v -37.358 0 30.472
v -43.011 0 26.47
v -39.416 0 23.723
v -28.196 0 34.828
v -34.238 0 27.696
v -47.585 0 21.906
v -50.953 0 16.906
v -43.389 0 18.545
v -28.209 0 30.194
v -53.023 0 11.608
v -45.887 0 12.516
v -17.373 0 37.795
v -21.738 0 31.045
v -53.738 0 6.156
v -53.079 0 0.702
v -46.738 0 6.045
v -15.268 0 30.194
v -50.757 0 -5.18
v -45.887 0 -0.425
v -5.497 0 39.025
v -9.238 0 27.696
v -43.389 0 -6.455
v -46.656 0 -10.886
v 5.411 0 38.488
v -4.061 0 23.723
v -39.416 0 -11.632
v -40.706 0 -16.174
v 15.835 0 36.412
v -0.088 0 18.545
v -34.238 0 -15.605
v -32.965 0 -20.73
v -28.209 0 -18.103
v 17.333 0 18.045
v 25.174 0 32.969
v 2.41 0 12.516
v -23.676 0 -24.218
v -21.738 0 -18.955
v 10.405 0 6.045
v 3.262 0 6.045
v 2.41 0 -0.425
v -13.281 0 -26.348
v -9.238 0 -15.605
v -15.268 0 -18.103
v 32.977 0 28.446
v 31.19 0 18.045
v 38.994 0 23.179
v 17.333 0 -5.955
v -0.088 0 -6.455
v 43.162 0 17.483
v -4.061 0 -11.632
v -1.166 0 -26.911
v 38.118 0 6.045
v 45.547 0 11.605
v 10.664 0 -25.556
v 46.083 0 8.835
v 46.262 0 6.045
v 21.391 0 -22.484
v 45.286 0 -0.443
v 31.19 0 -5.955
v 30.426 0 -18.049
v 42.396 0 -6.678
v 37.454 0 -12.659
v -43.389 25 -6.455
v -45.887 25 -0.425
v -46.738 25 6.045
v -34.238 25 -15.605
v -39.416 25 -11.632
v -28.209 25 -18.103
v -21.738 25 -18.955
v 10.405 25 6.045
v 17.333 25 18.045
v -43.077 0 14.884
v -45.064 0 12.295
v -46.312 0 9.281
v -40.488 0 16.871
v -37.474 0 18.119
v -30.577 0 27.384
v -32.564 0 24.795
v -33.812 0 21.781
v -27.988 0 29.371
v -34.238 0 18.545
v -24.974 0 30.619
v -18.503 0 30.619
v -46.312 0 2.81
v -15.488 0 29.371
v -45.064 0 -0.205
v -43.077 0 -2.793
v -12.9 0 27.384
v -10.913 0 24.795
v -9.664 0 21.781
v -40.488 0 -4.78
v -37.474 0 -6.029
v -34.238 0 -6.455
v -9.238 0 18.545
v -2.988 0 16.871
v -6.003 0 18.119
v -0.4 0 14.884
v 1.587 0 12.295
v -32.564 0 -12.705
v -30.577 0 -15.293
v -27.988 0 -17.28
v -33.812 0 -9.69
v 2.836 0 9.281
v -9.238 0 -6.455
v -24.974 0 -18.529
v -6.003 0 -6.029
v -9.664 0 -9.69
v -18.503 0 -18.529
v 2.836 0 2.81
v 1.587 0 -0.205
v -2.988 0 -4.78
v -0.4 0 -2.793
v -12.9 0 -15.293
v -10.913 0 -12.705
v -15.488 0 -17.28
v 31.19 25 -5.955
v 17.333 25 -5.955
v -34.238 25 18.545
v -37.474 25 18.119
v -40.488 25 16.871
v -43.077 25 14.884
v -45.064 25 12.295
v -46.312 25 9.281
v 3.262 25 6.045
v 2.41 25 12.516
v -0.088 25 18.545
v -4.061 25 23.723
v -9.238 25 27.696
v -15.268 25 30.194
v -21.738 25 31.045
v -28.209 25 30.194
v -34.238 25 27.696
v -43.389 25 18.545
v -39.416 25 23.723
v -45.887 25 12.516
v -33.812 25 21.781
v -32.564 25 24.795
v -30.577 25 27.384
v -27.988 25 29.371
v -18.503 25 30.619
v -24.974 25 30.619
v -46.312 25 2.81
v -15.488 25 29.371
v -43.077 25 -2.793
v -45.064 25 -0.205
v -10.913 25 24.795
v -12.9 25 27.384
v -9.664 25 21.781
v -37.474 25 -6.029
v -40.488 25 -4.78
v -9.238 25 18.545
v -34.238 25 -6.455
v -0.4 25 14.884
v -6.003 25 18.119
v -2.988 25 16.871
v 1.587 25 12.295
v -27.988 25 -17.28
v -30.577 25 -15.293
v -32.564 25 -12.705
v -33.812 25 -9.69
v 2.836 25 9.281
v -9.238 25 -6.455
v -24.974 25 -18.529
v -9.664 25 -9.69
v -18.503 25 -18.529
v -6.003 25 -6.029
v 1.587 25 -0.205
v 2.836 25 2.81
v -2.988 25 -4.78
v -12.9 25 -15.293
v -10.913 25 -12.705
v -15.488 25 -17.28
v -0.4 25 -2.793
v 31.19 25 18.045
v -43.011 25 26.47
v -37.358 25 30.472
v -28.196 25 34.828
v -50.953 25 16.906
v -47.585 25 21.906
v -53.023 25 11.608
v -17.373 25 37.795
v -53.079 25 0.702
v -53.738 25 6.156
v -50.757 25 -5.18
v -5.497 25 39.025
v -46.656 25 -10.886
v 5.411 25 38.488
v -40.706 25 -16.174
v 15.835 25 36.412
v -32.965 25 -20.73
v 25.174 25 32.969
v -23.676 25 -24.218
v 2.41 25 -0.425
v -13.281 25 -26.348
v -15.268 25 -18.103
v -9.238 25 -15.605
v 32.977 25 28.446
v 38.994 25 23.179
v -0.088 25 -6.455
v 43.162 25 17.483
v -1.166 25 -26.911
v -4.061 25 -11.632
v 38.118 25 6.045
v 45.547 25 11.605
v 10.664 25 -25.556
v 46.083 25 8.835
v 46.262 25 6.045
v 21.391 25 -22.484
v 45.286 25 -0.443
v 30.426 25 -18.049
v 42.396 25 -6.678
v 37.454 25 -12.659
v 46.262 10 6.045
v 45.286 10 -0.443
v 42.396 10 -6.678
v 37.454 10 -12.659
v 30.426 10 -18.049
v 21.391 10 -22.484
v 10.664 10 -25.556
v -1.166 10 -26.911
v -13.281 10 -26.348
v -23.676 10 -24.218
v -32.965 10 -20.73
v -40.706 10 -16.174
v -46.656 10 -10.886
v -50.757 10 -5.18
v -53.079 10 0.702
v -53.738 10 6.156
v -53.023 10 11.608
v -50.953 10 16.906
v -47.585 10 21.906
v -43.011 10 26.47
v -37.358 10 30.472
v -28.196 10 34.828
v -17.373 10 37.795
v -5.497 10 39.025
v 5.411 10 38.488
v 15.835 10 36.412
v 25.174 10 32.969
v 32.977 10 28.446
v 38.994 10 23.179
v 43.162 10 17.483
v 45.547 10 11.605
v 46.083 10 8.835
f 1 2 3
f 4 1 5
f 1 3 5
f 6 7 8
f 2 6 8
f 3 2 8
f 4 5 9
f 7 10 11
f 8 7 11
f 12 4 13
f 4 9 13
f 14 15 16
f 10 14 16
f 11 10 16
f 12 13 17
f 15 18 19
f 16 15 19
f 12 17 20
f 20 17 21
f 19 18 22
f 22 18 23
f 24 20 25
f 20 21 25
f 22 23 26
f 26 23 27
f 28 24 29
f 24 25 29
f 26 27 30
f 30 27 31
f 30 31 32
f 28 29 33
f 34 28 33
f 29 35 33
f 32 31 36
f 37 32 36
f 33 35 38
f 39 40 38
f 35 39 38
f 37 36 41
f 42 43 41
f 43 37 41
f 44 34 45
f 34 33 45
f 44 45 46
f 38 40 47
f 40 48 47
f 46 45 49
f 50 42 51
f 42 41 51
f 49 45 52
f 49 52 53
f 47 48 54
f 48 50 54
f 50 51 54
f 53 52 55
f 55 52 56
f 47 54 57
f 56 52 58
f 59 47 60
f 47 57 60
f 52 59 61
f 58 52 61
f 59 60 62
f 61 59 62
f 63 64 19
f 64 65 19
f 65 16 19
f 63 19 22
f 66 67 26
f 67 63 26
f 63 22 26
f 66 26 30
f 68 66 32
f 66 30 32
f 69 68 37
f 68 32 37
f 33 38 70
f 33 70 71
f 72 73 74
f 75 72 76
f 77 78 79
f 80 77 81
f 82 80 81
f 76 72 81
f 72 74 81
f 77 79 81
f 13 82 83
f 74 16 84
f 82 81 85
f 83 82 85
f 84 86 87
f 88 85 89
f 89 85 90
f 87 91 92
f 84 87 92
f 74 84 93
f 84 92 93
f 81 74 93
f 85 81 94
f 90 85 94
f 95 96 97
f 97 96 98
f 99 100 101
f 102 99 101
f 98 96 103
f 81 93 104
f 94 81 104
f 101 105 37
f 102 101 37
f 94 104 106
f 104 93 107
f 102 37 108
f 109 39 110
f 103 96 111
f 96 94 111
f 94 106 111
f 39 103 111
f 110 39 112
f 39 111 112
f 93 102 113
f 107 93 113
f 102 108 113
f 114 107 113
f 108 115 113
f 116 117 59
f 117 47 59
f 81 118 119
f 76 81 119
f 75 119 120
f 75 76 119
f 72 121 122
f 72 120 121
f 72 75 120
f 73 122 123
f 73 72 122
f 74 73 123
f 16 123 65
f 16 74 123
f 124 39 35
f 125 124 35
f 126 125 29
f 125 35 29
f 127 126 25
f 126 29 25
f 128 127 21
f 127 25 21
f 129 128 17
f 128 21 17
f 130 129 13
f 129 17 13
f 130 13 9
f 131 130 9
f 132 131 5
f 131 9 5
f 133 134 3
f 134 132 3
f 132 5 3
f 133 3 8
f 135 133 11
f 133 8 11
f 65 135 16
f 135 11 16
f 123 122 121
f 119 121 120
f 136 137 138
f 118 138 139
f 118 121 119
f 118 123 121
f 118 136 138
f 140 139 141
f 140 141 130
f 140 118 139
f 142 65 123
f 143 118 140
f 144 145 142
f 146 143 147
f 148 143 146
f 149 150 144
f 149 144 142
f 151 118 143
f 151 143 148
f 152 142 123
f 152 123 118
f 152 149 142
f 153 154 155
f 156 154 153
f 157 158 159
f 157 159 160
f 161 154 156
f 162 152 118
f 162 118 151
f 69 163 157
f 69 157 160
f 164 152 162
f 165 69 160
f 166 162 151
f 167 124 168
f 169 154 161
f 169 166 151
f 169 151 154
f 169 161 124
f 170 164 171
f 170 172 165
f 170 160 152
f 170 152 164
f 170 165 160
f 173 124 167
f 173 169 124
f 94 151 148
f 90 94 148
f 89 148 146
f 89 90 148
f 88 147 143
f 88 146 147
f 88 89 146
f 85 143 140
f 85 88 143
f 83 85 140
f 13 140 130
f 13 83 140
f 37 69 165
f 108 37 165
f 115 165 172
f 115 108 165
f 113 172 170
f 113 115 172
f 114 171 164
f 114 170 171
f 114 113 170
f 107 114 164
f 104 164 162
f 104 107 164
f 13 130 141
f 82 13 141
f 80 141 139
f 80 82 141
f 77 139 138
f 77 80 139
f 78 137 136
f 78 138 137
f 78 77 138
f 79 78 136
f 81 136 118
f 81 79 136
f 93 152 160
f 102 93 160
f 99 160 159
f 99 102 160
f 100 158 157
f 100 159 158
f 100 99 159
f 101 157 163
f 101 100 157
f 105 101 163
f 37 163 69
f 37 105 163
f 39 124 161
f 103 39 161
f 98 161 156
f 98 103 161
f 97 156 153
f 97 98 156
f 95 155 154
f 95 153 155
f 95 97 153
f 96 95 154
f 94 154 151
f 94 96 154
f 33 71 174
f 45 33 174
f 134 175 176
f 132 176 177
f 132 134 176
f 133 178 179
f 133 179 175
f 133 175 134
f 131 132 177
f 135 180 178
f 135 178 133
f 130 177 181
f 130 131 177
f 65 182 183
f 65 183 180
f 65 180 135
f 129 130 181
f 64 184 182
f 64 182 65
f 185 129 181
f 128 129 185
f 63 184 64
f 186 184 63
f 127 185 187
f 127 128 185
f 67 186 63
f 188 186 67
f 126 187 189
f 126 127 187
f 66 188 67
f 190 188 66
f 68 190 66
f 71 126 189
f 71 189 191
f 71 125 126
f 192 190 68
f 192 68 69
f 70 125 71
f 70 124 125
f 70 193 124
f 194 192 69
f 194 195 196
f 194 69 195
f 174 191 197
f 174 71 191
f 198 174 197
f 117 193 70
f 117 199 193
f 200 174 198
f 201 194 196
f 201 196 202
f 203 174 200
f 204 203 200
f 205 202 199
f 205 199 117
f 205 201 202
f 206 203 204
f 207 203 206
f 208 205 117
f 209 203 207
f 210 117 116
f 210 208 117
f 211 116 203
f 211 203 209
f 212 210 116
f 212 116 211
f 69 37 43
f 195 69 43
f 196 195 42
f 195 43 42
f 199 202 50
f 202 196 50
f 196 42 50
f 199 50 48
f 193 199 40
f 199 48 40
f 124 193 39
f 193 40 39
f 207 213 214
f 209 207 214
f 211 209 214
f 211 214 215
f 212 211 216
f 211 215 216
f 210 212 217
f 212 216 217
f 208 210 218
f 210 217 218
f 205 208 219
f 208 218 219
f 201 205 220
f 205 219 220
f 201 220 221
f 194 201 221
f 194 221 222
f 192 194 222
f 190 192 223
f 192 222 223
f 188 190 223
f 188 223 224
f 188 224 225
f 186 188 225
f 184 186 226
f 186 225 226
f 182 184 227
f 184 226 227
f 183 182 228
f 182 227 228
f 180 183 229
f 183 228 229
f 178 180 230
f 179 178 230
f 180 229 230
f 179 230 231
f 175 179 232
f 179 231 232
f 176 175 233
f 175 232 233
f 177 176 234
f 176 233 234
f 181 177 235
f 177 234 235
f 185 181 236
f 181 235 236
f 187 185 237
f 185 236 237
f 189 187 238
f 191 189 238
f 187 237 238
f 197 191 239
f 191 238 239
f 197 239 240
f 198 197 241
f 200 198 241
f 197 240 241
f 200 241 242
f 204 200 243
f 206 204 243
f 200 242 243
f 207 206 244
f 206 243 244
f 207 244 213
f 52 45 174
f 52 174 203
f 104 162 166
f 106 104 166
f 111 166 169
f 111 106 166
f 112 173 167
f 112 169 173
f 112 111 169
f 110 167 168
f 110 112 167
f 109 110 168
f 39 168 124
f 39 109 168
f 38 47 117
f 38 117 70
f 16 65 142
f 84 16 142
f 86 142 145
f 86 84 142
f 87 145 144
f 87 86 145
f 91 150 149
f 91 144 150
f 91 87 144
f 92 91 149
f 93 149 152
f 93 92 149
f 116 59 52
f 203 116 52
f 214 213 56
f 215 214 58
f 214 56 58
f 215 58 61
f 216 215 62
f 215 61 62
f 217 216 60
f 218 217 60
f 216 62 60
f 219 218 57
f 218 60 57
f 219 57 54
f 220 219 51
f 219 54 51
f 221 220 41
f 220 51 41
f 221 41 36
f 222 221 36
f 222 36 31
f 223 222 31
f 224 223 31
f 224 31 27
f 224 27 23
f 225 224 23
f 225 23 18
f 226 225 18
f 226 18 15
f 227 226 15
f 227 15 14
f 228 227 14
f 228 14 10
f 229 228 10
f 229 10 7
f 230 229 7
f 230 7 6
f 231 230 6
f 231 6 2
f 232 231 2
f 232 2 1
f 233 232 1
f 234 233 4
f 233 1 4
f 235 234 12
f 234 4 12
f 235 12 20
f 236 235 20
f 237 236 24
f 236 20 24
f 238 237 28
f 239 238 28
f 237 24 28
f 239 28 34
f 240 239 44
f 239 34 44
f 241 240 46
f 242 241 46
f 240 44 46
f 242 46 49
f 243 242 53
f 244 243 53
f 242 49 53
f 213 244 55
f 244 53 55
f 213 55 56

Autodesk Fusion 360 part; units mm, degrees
sketch "草图1" plane through (0, 0, 0) normal (0, 1, 0) x (1, 0, 0)
  ellipse E0 centre (-3.7384, -6.0454) end of major axis (46.2616, -6.0454) minor radius 33
  circle A0 centre (-21.7384, -6.0454) radius 25
  line L0 (17.3334, 5.9546) -> (31.1898, 5.9546)
  line L1 (14.987, -18.0454) -> (31.1898, -18.0454)
  line L2 (31.1898, 5.9546) -> (38.118, -6.0454)
  line L3 (31.1898, -18.0454) -> (38.118, -6.0454)
  line L4 (17.3334, 5.9546) -> (10.4052, -6.0454)
  line L5 (10.4052, -6.0454) -> (17.3334, -18.0454)
  line L6 (-53.7384, -6.0454) -> (10.4052, -6.0454) construction
  line L7 (38.118, -6.0454) -> (46.2616, -6.0454) construction
  line L8 (-3.7384, -39.0454) -> (-3.7384, -23.3947) construction
  line L9 (-3.7384, 11.304) -> (-3.7384, 26.9546) construction
  arc A1 (-34.2384, 6.4546) -> (-34.2384, -18.5454) centre (-34.2384, -6.0454) ccw
  arc A2 (-9.2384, 6.4546) -> (-34.2384, 6.4546) centre (-21.7384, 6.4546) ccw
  arc A3 (-34.2384, -18.5454) -> (-9.2384, -18.5454) centre (-21.7384, -18.5454) ccw
  arc A4 (-9.2384, -18.5454) -> (-9.2384, 6.4546) centre (-9.2384, -6.0454) ccw
  dimension "d1" = 100
  dimension "d2" = 66
  dimension "d4" = 50
extrude "拉伸1" add sketch "草图1" along normal blind 10 contours E0 | A1 A2 A3 A4
extrude "拉伸2" add 2 faces at (8.5366, 10, -13.0979) (-25.9051, 10, 1.8787) along direction (0, 1, 0) blind 15
